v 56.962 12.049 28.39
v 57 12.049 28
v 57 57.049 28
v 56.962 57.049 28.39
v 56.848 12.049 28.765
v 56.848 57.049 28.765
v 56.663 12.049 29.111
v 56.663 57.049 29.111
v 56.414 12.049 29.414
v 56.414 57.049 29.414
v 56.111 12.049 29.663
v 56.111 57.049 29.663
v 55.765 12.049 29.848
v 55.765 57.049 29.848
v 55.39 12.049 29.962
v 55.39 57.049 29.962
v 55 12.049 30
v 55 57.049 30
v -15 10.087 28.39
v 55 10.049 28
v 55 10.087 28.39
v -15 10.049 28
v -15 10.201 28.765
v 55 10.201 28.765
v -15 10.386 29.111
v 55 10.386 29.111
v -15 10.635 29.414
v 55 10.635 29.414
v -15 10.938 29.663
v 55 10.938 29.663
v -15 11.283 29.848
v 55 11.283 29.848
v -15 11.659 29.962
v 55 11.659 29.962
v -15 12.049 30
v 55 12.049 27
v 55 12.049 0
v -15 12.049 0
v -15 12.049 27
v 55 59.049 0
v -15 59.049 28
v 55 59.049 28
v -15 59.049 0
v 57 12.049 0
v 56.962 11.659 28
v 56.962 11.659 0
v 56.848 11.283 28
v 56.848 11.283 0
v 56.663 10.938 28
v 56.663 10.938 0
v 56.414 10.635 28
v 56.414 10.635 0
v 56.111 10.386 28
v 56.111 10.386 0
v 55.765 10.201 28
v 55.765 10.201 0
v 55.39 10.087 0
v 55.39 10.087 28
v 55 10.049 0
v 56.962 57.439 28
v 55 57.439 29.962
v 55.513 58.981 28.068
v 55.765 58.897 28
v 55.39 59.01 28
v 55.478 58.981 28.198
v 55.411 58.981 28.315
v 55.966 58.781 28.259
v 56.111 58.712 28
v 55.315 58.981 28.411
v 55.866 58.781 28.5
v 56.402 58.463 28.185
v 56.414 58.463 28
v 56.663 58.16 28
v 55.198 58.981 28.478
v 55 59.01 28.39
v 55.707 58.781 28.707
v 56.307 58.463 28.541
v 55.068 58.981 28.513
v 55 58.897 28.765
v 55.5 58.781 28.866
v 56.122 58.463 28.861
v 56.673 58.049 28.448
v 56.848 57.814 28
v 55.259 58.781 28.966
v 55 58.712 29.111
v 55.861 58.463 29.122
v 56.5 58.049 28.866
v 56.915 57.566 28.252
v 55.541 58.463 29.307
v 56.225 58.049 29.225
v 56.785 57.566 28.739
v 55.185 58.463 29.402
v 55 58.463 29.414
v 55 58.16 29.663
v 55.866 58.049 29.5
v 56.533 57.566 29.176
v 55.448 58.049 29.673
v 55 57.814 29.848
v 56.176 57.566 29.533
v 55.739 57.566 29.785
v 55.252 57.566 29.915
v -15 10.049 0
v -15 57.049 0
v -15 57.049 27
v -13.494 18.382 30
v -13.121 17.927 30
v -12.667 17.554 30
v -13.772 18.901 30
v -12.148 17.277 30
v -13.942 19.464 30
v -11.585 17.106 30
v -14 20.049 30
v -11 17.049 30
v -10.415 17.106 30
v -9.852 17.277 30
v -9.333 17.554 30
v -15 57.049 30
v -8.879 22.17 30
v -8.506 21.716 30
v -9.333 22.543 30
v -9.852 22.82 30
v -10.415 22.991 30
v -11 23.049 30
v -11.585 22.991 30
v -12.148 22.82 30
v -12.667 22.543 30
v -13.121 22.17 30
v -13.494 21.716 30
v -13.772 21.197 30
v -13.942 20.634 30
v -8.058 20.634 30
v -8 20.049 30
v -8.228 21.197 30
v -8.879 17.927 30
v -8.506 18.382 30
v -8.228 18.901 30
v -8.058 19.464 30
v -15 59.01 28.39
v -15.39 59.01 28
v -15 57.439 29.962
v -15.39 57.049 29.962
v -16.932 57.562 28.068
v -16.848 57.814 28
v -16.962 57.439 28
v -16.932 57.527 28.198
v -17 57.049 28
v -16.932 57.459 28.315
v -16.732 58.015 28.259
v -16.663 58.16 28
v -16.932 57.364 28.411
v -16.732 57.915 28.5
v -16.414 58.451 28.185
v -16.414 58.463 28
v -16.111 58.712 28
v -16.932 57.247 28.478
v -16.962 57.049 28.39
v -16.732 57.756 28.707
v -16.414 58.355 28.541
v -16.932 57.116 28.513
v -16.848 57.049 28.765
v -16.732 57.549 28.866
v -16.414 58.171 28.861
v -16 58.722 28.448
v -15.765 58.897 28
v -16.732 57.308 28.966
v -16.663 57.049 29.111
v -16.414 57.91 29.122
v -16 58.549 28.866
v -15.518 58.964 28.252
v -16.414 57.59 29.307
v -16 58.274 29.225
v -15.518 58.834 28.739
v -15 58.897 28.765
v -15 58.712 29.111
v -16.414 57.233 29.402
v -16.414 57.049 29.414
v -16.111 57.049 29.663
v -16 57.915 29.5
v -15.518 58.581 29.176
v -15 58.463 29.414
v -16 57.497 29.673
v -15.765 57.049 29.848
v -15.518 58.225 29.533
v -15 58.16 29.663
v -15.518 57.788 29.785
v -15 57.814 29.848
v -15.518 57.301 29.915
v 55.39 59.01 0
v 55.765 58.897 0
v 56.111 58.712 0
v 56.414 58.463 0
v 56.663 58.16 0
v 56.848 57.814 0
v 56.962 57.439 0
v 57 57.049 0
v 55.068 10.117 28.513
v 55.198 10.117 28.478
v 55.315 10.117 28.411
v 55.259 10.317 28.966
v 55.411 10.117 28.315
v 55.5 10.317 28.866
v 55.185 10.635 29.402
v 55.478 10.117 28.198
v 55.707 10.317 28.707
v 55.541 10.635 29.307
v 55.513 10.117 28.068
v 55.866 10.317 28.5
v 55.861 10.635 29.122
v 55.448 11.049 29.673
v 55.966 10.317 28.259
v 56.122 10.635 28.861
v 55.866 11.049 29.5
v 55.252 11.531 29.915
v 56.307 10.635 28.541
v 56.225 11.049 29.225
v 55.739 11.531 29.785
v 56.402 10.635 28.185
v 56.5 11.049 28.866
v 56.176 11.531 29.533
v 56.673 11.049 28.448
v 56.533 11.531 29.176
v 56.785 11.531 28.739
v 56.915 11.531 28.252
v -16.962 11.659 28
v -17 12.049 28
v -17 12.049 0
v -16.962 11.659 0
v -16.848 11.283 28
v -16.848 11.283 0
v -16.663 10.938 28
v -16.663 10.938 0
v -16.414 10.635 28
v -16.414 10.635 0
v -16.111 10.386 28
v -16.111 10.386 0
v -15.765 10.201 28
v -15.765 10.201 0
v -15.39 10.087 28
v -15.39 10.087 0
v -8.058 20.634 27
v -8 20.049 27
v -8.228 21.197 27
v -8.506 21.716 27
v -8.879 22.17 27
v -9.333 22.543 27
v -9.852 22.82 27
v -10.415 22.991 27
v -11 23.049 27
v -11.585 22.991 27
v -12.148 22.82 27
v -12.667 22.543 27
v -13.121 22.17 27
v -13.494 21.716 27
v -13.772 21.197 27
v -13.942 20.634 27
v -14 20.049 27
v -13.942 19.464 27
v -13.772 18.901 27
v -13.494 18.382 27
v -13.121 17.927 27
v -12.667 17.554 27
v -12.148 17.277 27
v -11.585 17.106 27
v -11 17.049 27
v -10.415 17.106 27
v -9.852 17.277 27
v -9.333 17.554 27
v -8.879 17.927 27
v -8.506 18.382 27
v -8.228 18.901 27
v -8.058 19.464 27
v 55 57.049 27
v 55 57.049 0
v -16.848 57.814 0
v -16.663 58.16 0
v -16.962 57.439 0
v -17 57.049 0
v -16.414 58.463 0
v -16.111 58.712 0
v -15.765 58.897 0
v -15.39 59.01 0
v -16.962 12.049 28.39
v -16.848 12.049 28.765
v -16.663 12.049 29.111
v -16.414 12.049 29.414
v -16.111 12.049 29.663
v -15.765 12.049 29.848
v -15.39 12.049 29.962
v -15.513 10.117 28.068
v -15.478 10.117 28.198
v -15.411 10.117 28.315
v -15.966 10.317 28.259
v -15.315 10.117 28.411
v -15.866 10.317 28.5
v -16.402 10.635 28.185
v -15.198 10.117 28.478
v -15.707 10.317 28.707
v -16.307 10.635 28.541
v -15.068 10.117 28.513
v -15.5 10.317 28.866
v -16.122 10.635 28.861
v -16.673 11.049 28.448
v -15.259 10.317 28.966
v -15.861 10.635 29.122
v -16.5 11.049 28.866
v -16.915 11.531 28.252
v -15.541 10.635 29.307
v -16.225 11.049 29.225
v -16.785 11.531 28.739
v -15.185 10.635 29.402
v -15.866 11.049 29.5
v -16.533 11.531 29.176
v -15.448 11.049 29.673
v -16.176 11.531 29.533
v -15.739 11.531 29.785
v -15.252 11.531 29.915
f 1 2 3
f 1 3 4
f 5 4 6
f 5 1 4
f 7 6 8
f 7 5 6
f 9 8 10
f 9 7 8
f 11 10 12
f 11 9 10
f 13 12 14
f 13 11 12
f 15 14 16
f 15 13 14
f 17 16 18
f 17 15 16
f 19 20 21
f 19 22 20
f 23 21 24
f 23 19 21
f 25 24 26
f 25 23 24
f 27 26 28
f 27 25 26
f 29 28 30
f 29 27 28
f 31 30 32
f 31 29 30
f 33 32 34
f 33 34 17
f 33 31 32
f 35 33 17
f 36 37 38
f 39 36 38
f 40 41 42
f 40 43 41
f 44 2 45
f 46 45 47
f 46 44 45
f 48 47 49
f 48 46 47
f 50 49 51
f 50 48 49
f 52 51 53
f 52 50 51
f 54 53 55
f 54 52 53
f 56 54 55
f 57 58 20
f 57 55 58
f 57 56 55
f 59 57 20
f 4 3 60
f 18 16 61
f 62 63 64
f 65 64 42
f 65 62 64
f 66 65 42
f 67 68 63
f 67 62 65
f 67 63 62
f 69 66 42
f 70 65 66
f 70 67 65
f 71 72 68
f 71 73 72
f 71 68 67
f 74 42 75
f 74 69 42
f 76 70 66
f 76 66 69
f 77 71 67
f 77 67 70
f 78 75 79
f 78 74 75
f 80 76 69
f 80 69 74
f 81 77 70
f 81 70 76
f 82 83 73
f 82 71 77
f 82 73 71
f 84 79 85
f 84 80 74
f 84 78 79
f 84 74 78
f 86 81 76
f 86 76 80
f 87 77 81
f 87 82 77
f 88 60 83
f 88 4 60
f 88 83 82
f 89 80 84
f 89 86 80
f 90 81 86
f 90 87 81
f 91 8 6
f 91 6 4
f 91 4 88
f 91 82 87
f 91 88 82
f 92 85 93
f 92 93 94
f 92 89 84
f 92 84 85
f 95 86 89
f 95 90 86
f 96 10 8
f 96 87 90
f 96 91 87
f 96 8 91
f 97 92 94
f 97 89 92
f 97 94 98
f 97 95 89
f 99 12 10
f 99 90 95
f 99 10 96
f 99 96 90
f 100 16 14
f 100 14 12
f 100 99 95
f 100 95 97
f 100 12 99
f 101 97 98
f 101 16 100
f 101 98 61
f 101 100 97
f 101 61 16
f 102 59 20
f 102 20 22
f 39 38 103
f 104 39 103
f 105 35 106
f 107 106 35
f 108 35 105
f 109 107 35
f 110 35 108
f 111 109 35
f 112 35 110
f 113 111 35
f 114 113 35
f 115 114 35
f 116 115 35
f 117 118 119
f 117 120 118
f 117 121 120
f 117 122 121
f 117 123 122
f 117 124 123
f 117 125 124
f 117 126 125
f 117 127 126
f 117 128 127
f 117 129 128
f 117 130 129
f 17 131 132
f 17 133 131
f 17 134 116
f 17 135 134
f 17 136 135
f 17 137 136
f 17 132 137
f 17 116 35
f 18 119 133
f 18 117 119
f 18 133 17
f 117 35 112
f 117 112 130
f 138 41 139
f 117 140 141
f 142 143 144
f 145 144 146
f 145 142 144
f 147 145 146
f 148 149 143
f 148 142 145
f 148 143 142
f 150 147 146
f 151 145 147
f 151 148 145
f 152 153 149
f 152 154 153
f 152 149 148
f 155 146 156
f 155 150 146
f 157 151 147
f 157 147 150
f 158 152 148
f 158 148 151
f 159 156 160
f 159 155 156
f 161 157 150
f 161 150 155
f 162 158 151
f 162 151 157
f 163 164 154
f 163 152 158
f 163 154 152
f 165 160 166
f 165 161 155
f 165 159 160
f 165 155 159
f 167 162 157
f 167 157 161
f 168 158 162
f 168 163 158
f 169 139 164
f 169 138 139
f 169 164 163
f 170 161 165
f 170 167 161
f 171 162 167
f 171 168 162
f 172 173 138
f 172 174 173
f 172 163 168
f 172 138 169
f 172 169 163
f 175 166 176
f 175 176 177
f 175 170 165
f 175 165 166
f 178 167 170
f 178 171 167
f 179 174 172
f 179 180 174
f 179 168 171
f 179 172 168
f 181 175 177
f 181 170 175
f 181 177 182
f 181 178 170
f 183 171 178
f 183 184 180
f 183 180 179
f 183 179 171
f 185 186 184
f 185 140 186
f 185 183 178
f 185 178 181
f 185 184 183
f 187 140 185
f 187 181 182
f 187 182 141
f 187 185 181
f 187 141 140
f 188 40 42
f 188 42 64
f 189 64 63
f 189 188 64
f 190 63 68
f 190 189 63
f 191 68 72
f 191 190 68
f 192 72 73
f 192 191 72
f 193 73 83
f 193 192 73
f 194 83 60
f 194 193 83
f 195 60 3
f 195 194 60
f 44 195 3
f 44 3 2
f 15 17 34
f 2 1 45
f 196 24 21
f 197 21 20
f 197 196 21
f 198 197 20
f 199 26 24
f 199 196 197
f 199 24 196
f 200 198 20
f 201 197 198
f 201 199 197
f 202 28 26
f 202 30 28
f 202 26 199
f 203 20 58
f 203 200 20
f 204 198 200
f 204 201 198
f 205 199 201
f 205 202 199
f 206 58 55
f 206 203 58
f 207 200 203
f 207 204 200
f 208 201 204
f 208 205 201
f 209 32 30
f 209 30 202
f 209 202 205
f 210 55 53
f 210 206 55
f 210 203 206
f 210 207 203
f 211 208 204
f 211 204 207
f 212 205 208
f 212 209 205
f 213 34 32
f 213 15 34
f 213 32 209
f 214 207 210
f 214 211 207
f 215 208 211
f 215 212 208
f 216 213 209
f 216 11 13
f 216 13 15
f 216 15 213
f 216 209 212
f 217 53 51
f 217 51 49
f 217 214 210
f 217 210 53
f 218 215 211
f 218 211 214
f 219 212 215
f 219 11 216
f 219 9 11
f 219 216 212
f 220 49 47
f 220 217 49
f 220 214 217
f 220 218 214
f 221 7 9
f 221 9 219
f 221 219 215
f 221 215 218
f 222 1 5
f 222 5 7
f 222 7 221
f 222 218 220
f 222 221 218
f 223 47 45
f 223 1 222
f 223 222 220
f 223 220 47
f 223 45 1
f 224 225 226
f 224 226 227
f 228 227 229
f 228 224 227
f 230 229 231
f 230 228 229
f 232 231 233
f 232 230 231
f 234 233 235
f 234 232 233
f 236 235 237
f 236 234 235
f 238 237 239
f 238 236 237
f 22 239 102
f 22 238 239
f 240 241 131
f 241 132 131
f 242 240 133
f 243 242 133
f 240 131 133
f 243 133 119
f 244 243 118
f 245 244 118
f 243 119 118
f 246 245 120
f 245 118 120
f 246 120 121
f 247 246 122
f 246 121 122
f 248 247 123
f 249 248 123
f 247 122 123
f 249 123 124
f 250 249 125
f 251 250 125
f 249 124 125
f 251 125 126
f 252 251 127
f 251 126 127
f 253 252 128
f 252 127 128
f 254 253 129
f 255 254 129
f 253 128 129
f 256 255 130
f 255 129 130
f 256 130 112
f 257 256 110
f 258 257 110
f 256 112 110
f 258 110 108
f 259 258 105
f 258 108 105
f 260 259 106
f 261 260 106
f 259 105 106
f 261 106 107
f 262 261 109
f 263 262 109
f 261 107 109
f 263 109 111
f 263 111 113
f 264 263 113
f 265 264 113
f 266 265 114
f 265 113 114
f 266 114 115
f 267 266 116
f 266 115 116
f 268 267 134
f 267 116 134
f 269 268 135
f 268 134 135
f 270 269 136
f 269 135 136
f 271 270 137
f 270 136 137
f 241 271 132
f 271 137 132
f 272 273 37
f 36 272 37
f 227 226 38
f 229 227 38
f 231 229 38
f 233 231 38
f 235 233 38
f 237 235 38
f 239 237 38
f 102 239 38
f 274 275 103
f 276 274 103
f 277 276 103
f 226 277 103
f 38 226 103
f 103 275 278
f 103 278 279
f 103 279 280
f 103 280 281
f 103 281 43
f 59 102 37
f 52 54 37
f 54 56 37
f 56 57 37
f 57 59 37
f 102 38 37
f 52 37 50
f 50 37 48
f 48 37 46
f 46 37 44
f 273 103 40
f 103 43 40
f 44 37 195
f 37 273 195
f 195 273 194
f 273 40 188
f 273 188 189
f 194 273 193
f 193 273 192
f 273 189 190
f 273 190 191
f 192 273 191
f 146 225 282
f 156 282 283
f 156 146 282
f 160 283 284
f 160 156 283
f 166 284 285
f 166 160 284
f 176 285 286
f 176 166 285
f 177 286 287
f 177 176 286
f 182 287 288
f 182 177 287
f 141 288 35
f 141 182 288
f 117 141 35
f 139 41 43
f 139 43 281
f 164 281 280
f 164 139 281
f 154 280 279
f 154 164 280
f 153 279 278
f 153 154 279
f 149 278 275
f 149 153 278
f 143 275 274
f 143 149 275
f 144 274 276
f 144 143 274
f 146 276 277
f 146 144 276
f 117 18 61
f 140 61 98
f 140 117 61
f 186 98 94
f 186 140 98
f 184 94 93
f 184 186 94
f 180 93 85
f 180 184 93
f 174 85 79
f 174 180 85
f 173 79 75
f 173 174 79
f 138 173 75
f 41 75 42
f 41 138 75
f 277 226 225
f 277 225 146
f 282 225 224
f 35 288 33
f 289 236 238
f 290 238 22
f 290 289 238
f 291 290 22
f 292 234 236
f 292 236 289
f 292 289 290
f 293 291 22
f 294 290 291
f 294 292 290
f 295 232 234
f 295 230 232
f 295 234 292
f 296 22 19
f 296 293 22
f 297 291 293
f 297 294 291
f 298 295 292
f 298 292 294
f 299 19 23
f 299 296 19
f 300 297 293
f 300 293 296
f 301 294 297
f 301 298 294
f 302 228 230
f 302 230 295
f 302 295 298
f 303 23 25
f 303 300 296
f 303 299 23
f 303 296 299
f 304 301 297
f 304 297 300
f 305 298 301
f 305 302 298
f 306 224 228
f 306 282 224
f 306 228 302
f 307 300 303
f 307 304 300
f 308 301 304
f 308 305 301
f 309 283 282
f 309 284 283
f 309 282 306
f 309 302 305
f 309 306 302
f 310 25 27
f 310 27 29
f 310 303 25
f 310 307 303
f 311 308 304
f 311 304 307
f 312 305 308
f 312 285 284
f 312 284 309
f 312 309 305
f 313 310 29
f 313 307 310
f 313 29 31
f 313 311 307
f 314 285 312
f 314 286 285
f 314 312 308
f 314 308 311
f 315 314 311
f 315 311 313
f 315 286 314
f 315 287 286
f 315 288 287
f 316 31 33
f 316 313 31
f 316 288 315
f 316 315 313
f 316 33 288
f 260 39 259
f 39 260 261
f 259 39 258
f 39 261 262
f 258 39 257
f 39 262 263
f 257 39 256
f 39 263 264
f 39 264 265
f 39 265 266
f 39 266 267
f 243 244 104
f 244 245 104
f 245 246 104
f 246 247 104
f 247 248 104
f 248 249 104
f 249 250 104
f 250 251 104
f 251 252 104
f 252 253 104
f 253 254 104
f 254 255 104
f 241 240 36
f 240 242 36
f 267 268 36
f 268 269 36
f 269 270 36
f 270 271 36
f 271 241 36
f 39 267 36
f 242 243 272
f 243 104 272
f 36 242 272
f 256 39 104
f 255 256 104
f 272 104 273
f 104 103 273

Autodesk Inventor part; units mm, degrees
ref_plane "YZ Plane" through (0, 0, 0) normal (1, 0, 0) x (0, 1, 0)
ref_plane "XZ Plane" through (0, 0, 0) normal (0, 1, 0) x (-1, 0, 0)
ref_plane "XY Plane" through (0, 0, 0) normal (0, 0, 1) x (1, 0, 0)
sketch "Sketch1" plane through (0, 0, 0) normal (0, 0, 1) x (1, 0, 0)
  line L0 (-15, 57.0488) -> (55, 57.0488)
  line L1 (-15, 12.0488) -> (-15, 57.0488)
  line L2 (55, 12.0488) -> (-15, 12.0488)
  line L3 (55, 57.0488) -> (55, 12.0488)
  line L4 (-17, 59.0488) -> (57, 59.0488)
  line L5 (57, 59.0488) -> (57, 10.0488)
  line L6 (57, 10.0488) -> (-17, 10.0488)
  line L7 (-17, 10.0488) -> (-17, 59.0488)
  point P0 (0, 0)
  dimension "d0" = 74
  dimension "d1" = 49
  dimension "d2" = 2
  dimension "d3" = 2
extrude "Extrusion1" add sketch "Sketch1" along normal blind 27
sketch "Sketch2" plane through (0, 0, 27) normal (0, 0, 1) x (1, 0, 0)
  line L0 (57, 59.0488) -> (-17, 59.0488) projected
  line L1 (-17, 59.0488) -> (57, 59.0488)
  line L2 (57, 59.0488) -> (57, 10.0488)
  line L3 (57, 10.0488) -> (-17, 10.0488)
  line L4 (-17, 10.0488) -> (-17, 59.0488)
  point P0 (0, 0)
extrude "Extrusion2" add sketch "Sketch2" along normal blind 3
sketch "Sketch3" plane through (0, 0, 30) normal (0, 0, 1) x (1, 0, 0)
  circle A0 centre (-11, 20.0488) radius 3
  line L0 (-17, 10.0488) -> (57, 10.0488) projected
  line L1 (-17, 59.0488) -> (-17, 10.0488) projected
  point P0 (0, 0)
  dimension "d8" = 6
  dimension "d9" = 10
  dimension "d10" = 6
extrude "Extrusion3" cut sketch "Sketch3" against normal up to next
fillet "Fillet1" radius 2 8 edges at (57, 34.5488, 30) (20, 59.0488, 30) (57, 59.0488, 15) (57, 10.0488, 15) (-17, 59.0488, 15) (-17, 34.5488, 30) (-17, 10.0488, 15) (20, 10.0488, 30)
properties part number "Extrusion"
